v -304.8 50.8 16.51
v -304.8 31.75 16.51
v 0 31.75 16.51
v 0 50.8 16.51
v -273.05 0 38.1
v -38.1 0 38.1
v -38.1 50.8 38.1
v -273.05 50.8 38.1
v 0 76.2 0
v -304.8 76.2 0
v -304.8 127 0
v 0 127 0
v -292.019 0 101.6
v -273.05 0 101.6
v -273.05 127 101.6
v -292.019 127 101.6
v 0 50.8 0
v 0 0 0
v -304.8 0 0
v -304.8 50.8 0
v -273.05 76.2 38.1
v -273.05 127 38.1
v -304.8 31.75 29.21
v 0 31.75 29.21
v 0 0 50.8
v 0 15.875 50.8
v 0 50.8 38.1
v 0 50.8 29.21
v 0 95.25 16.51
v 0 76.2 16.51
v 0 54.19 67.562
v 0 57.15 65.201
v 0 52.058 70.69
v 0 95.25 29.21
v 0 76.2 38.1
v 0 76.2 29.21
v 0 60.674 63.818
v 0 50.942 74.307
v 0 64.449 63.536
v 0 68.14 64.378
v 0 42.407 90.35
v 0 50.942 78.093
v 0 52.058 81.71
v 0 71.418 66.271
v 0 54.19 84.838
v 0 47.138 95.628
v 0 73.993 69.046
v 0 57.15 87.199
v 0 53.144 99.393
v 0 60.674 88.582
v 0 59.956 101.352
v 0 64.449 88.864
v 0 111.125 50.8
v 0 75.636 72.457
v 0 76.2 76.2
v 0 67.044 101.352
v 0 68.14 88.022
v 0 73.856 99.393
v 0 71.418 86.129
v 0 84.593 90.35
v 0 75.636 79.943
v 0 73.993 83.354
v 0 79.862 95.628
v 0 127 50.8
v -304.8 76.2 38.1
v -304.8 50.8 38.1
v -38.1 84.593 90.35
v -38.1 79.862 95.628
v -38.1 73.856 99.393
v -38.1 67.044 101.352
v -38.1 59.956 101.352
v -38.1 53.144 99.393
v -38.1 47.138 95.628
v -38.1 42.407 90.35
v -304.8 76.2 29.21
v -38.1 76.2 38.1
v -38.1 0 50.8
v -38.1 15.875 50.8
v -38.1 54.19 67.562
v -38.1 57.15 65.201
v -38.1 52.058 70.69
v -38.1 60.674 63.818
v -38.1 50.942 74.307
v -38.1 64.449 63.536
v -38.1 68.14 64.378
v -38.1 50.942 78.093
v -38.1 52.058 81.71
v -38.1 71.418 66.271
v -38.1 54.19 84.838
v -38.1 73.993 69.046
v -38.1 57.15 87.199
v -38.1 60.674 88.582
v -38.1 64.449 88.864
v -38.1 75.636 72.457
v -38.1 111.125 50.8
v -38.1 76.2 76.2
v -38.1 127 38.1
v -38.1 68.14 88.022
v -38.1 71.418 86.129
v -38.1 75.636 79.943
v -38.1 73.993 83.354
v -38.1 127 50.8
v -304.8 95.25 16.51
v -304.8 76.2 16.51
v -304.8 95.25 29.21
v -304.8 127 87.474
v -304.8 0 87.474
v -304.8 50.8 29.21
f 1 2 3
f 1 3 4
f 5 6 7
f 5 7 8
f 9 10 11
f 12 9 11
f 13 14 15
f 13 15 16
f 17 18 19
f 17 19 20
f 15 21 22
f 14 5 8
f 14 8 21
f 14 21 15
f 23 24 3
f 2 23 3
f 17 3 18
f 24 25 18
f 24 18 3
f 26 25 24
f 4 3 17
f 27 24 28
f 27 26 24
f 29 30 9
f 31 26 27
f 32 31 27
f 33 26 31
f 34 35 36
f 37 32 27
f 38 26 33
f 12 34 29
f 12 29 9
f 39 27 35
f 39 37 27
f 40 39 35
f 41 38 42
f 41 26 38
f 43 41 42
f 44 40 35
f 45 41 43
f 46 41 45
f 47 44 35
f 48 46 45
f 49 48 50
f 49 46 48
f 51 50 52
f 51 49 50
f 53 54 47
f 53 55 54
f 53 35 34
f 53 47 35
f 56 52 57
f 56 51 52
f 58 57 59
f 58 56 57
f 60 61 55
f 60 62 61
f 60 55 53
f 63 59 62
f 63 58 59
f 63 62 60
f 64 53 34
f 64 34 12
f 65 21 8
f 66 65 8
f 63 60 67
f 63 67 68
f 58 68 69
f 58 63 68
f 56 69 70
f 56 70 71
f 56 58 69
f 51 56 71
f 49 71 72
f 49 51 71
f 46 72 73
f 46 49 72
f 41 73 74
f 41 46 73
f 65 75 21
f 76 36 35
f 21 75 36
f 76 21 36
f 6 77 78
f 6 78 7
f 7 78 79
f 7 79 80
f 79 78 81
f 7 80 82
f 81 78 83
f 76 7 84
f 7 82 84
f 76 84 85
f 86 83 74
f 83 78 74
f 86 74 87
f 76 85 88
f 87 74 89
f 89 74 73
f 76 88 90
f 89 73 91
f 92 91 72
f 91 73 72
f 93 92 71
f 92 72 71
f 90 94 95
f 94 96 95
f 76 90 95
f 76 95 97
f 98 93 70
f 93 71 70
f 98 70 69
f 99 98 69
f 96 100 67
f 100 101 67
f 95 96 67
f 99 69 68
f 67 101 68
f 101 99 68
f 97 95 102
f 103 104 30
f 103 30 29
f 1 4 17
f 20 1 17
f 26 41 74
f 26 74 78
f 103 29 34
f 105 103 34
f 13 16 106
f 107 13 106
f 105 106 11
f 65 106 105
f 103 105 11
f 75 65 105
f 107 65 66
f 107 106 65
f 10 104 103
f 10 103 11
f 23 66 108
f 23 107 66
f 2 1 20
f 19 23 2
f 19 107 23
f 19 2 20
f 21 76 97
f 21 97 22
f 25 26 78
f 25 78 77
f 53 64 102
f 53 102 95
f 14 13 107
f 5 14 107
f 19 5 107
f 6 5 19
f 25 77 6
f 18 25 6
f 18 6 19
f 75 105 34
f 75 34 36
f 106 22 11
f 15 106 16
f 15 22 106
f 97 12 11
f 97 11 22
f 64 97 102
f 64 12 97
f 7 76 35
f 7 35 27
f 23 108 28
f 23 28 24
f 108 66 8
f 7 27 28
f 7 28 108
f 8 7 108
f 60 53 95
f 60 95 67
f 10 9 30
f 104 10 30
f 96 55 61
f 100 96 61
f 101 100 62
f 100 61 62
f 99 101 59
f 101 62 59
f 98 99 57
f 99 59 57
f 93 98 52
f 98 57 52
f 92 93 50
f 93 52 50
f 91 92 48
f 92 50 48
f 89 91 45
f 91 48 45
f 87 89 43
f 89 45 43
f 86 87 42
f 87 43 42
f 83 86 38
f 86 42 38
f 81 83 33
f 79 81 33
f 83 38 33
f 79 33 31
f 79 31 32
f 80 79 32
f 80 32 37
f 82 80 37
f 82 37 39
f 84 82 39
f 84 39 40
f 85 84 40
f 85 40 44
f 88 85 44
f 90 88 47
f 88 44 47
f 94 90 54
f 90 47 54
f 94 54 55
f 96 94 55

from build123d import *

# Parameters (mm, degrees)
F0_R     = 12.7
F2_DEPTH = 38.1
F3_DEPTH = 127
F4_DEPTH = 304.801


with BuildPart() as f2:
    # F0 (on Right) → F2 (new body)
    with BuildSketch(Plane.YZ):
        with BuildLine():
            Line((0, 50.8), (0, 0))
            Line((0, 0), (50.8, 0))
            Line((50.8, 0), (50.8, 16.51))
            Line((50.8, 16.51), (31.75, 16.51))
            Line((31.75, 16.51), (31.75, 29.21))
            Line((31.75, 29.21), (50.8, 29.21))
            Line((50.8, 29.21), (50.8, 38.1))
            Line((50.8, 38.1), (76.2, 38.1))
            Line((76.2, 38.1), (76.2, 29.21))
            Line((76.2, 29.21), (95.25, 29.21))
            Line((95.25, 29.21), (95.25, 16.51))
            Line((95.25, 16.51), (76.2, 16.51))
            Line((76.2, 16.51), (76.2, 0))
            Line((76.2, 0), (127, 0))
            Line((127, 0), (127, 50.8))
            Line((127, 50.8), (111.125, 50.8))
            Line((111.125, 50.8), (84.593426, 90.350173))
            ThreePointArc((84.593426, 90.350173), (63.5, 101.6), (42.406574, 90.350173))
            Line((42.406574, 90.350173), (15.875, 50.8))
            Line((15.875, 50.8), (0, 50.8))
        make_face()
        with Locations((63.5, 76.2)):
            Circle(F0_R, mode=Mode.SUBTRACT)
    extrude(amount=-F2_DEPTH)

    # F1 (on Front) → F3 (join)
    with BuildSketch(Plane.XZ):
        Polygon((0, 0), (0, 38.1), (-273.05, 38.1), (-273.05, 101.6), (-292.019098, 101.6), (-304.8, 87.473746), (-304.8, 0), align=None)
    extrude(amount=-F3_DEPTH)

    # F0 (on Right) → F4 (cut, through all)
    with BuildSketch(Plane.YZ):
        Polygon((50.8, 16.51), (50.8, 0), (76.2, 0), (76.2, 16.51), (95.25, 16.51), (95.25, 29.21), (76.2, 29.21), (76.2, 38.1), (50.8, 38.1), (50.8, 29.21), (31.75, 29.21), (31.75, 16.51), align=None)
    extrude(amount=-F4_DEPTH, mode=Mode.SUBTRACT)


solid = f2.part
